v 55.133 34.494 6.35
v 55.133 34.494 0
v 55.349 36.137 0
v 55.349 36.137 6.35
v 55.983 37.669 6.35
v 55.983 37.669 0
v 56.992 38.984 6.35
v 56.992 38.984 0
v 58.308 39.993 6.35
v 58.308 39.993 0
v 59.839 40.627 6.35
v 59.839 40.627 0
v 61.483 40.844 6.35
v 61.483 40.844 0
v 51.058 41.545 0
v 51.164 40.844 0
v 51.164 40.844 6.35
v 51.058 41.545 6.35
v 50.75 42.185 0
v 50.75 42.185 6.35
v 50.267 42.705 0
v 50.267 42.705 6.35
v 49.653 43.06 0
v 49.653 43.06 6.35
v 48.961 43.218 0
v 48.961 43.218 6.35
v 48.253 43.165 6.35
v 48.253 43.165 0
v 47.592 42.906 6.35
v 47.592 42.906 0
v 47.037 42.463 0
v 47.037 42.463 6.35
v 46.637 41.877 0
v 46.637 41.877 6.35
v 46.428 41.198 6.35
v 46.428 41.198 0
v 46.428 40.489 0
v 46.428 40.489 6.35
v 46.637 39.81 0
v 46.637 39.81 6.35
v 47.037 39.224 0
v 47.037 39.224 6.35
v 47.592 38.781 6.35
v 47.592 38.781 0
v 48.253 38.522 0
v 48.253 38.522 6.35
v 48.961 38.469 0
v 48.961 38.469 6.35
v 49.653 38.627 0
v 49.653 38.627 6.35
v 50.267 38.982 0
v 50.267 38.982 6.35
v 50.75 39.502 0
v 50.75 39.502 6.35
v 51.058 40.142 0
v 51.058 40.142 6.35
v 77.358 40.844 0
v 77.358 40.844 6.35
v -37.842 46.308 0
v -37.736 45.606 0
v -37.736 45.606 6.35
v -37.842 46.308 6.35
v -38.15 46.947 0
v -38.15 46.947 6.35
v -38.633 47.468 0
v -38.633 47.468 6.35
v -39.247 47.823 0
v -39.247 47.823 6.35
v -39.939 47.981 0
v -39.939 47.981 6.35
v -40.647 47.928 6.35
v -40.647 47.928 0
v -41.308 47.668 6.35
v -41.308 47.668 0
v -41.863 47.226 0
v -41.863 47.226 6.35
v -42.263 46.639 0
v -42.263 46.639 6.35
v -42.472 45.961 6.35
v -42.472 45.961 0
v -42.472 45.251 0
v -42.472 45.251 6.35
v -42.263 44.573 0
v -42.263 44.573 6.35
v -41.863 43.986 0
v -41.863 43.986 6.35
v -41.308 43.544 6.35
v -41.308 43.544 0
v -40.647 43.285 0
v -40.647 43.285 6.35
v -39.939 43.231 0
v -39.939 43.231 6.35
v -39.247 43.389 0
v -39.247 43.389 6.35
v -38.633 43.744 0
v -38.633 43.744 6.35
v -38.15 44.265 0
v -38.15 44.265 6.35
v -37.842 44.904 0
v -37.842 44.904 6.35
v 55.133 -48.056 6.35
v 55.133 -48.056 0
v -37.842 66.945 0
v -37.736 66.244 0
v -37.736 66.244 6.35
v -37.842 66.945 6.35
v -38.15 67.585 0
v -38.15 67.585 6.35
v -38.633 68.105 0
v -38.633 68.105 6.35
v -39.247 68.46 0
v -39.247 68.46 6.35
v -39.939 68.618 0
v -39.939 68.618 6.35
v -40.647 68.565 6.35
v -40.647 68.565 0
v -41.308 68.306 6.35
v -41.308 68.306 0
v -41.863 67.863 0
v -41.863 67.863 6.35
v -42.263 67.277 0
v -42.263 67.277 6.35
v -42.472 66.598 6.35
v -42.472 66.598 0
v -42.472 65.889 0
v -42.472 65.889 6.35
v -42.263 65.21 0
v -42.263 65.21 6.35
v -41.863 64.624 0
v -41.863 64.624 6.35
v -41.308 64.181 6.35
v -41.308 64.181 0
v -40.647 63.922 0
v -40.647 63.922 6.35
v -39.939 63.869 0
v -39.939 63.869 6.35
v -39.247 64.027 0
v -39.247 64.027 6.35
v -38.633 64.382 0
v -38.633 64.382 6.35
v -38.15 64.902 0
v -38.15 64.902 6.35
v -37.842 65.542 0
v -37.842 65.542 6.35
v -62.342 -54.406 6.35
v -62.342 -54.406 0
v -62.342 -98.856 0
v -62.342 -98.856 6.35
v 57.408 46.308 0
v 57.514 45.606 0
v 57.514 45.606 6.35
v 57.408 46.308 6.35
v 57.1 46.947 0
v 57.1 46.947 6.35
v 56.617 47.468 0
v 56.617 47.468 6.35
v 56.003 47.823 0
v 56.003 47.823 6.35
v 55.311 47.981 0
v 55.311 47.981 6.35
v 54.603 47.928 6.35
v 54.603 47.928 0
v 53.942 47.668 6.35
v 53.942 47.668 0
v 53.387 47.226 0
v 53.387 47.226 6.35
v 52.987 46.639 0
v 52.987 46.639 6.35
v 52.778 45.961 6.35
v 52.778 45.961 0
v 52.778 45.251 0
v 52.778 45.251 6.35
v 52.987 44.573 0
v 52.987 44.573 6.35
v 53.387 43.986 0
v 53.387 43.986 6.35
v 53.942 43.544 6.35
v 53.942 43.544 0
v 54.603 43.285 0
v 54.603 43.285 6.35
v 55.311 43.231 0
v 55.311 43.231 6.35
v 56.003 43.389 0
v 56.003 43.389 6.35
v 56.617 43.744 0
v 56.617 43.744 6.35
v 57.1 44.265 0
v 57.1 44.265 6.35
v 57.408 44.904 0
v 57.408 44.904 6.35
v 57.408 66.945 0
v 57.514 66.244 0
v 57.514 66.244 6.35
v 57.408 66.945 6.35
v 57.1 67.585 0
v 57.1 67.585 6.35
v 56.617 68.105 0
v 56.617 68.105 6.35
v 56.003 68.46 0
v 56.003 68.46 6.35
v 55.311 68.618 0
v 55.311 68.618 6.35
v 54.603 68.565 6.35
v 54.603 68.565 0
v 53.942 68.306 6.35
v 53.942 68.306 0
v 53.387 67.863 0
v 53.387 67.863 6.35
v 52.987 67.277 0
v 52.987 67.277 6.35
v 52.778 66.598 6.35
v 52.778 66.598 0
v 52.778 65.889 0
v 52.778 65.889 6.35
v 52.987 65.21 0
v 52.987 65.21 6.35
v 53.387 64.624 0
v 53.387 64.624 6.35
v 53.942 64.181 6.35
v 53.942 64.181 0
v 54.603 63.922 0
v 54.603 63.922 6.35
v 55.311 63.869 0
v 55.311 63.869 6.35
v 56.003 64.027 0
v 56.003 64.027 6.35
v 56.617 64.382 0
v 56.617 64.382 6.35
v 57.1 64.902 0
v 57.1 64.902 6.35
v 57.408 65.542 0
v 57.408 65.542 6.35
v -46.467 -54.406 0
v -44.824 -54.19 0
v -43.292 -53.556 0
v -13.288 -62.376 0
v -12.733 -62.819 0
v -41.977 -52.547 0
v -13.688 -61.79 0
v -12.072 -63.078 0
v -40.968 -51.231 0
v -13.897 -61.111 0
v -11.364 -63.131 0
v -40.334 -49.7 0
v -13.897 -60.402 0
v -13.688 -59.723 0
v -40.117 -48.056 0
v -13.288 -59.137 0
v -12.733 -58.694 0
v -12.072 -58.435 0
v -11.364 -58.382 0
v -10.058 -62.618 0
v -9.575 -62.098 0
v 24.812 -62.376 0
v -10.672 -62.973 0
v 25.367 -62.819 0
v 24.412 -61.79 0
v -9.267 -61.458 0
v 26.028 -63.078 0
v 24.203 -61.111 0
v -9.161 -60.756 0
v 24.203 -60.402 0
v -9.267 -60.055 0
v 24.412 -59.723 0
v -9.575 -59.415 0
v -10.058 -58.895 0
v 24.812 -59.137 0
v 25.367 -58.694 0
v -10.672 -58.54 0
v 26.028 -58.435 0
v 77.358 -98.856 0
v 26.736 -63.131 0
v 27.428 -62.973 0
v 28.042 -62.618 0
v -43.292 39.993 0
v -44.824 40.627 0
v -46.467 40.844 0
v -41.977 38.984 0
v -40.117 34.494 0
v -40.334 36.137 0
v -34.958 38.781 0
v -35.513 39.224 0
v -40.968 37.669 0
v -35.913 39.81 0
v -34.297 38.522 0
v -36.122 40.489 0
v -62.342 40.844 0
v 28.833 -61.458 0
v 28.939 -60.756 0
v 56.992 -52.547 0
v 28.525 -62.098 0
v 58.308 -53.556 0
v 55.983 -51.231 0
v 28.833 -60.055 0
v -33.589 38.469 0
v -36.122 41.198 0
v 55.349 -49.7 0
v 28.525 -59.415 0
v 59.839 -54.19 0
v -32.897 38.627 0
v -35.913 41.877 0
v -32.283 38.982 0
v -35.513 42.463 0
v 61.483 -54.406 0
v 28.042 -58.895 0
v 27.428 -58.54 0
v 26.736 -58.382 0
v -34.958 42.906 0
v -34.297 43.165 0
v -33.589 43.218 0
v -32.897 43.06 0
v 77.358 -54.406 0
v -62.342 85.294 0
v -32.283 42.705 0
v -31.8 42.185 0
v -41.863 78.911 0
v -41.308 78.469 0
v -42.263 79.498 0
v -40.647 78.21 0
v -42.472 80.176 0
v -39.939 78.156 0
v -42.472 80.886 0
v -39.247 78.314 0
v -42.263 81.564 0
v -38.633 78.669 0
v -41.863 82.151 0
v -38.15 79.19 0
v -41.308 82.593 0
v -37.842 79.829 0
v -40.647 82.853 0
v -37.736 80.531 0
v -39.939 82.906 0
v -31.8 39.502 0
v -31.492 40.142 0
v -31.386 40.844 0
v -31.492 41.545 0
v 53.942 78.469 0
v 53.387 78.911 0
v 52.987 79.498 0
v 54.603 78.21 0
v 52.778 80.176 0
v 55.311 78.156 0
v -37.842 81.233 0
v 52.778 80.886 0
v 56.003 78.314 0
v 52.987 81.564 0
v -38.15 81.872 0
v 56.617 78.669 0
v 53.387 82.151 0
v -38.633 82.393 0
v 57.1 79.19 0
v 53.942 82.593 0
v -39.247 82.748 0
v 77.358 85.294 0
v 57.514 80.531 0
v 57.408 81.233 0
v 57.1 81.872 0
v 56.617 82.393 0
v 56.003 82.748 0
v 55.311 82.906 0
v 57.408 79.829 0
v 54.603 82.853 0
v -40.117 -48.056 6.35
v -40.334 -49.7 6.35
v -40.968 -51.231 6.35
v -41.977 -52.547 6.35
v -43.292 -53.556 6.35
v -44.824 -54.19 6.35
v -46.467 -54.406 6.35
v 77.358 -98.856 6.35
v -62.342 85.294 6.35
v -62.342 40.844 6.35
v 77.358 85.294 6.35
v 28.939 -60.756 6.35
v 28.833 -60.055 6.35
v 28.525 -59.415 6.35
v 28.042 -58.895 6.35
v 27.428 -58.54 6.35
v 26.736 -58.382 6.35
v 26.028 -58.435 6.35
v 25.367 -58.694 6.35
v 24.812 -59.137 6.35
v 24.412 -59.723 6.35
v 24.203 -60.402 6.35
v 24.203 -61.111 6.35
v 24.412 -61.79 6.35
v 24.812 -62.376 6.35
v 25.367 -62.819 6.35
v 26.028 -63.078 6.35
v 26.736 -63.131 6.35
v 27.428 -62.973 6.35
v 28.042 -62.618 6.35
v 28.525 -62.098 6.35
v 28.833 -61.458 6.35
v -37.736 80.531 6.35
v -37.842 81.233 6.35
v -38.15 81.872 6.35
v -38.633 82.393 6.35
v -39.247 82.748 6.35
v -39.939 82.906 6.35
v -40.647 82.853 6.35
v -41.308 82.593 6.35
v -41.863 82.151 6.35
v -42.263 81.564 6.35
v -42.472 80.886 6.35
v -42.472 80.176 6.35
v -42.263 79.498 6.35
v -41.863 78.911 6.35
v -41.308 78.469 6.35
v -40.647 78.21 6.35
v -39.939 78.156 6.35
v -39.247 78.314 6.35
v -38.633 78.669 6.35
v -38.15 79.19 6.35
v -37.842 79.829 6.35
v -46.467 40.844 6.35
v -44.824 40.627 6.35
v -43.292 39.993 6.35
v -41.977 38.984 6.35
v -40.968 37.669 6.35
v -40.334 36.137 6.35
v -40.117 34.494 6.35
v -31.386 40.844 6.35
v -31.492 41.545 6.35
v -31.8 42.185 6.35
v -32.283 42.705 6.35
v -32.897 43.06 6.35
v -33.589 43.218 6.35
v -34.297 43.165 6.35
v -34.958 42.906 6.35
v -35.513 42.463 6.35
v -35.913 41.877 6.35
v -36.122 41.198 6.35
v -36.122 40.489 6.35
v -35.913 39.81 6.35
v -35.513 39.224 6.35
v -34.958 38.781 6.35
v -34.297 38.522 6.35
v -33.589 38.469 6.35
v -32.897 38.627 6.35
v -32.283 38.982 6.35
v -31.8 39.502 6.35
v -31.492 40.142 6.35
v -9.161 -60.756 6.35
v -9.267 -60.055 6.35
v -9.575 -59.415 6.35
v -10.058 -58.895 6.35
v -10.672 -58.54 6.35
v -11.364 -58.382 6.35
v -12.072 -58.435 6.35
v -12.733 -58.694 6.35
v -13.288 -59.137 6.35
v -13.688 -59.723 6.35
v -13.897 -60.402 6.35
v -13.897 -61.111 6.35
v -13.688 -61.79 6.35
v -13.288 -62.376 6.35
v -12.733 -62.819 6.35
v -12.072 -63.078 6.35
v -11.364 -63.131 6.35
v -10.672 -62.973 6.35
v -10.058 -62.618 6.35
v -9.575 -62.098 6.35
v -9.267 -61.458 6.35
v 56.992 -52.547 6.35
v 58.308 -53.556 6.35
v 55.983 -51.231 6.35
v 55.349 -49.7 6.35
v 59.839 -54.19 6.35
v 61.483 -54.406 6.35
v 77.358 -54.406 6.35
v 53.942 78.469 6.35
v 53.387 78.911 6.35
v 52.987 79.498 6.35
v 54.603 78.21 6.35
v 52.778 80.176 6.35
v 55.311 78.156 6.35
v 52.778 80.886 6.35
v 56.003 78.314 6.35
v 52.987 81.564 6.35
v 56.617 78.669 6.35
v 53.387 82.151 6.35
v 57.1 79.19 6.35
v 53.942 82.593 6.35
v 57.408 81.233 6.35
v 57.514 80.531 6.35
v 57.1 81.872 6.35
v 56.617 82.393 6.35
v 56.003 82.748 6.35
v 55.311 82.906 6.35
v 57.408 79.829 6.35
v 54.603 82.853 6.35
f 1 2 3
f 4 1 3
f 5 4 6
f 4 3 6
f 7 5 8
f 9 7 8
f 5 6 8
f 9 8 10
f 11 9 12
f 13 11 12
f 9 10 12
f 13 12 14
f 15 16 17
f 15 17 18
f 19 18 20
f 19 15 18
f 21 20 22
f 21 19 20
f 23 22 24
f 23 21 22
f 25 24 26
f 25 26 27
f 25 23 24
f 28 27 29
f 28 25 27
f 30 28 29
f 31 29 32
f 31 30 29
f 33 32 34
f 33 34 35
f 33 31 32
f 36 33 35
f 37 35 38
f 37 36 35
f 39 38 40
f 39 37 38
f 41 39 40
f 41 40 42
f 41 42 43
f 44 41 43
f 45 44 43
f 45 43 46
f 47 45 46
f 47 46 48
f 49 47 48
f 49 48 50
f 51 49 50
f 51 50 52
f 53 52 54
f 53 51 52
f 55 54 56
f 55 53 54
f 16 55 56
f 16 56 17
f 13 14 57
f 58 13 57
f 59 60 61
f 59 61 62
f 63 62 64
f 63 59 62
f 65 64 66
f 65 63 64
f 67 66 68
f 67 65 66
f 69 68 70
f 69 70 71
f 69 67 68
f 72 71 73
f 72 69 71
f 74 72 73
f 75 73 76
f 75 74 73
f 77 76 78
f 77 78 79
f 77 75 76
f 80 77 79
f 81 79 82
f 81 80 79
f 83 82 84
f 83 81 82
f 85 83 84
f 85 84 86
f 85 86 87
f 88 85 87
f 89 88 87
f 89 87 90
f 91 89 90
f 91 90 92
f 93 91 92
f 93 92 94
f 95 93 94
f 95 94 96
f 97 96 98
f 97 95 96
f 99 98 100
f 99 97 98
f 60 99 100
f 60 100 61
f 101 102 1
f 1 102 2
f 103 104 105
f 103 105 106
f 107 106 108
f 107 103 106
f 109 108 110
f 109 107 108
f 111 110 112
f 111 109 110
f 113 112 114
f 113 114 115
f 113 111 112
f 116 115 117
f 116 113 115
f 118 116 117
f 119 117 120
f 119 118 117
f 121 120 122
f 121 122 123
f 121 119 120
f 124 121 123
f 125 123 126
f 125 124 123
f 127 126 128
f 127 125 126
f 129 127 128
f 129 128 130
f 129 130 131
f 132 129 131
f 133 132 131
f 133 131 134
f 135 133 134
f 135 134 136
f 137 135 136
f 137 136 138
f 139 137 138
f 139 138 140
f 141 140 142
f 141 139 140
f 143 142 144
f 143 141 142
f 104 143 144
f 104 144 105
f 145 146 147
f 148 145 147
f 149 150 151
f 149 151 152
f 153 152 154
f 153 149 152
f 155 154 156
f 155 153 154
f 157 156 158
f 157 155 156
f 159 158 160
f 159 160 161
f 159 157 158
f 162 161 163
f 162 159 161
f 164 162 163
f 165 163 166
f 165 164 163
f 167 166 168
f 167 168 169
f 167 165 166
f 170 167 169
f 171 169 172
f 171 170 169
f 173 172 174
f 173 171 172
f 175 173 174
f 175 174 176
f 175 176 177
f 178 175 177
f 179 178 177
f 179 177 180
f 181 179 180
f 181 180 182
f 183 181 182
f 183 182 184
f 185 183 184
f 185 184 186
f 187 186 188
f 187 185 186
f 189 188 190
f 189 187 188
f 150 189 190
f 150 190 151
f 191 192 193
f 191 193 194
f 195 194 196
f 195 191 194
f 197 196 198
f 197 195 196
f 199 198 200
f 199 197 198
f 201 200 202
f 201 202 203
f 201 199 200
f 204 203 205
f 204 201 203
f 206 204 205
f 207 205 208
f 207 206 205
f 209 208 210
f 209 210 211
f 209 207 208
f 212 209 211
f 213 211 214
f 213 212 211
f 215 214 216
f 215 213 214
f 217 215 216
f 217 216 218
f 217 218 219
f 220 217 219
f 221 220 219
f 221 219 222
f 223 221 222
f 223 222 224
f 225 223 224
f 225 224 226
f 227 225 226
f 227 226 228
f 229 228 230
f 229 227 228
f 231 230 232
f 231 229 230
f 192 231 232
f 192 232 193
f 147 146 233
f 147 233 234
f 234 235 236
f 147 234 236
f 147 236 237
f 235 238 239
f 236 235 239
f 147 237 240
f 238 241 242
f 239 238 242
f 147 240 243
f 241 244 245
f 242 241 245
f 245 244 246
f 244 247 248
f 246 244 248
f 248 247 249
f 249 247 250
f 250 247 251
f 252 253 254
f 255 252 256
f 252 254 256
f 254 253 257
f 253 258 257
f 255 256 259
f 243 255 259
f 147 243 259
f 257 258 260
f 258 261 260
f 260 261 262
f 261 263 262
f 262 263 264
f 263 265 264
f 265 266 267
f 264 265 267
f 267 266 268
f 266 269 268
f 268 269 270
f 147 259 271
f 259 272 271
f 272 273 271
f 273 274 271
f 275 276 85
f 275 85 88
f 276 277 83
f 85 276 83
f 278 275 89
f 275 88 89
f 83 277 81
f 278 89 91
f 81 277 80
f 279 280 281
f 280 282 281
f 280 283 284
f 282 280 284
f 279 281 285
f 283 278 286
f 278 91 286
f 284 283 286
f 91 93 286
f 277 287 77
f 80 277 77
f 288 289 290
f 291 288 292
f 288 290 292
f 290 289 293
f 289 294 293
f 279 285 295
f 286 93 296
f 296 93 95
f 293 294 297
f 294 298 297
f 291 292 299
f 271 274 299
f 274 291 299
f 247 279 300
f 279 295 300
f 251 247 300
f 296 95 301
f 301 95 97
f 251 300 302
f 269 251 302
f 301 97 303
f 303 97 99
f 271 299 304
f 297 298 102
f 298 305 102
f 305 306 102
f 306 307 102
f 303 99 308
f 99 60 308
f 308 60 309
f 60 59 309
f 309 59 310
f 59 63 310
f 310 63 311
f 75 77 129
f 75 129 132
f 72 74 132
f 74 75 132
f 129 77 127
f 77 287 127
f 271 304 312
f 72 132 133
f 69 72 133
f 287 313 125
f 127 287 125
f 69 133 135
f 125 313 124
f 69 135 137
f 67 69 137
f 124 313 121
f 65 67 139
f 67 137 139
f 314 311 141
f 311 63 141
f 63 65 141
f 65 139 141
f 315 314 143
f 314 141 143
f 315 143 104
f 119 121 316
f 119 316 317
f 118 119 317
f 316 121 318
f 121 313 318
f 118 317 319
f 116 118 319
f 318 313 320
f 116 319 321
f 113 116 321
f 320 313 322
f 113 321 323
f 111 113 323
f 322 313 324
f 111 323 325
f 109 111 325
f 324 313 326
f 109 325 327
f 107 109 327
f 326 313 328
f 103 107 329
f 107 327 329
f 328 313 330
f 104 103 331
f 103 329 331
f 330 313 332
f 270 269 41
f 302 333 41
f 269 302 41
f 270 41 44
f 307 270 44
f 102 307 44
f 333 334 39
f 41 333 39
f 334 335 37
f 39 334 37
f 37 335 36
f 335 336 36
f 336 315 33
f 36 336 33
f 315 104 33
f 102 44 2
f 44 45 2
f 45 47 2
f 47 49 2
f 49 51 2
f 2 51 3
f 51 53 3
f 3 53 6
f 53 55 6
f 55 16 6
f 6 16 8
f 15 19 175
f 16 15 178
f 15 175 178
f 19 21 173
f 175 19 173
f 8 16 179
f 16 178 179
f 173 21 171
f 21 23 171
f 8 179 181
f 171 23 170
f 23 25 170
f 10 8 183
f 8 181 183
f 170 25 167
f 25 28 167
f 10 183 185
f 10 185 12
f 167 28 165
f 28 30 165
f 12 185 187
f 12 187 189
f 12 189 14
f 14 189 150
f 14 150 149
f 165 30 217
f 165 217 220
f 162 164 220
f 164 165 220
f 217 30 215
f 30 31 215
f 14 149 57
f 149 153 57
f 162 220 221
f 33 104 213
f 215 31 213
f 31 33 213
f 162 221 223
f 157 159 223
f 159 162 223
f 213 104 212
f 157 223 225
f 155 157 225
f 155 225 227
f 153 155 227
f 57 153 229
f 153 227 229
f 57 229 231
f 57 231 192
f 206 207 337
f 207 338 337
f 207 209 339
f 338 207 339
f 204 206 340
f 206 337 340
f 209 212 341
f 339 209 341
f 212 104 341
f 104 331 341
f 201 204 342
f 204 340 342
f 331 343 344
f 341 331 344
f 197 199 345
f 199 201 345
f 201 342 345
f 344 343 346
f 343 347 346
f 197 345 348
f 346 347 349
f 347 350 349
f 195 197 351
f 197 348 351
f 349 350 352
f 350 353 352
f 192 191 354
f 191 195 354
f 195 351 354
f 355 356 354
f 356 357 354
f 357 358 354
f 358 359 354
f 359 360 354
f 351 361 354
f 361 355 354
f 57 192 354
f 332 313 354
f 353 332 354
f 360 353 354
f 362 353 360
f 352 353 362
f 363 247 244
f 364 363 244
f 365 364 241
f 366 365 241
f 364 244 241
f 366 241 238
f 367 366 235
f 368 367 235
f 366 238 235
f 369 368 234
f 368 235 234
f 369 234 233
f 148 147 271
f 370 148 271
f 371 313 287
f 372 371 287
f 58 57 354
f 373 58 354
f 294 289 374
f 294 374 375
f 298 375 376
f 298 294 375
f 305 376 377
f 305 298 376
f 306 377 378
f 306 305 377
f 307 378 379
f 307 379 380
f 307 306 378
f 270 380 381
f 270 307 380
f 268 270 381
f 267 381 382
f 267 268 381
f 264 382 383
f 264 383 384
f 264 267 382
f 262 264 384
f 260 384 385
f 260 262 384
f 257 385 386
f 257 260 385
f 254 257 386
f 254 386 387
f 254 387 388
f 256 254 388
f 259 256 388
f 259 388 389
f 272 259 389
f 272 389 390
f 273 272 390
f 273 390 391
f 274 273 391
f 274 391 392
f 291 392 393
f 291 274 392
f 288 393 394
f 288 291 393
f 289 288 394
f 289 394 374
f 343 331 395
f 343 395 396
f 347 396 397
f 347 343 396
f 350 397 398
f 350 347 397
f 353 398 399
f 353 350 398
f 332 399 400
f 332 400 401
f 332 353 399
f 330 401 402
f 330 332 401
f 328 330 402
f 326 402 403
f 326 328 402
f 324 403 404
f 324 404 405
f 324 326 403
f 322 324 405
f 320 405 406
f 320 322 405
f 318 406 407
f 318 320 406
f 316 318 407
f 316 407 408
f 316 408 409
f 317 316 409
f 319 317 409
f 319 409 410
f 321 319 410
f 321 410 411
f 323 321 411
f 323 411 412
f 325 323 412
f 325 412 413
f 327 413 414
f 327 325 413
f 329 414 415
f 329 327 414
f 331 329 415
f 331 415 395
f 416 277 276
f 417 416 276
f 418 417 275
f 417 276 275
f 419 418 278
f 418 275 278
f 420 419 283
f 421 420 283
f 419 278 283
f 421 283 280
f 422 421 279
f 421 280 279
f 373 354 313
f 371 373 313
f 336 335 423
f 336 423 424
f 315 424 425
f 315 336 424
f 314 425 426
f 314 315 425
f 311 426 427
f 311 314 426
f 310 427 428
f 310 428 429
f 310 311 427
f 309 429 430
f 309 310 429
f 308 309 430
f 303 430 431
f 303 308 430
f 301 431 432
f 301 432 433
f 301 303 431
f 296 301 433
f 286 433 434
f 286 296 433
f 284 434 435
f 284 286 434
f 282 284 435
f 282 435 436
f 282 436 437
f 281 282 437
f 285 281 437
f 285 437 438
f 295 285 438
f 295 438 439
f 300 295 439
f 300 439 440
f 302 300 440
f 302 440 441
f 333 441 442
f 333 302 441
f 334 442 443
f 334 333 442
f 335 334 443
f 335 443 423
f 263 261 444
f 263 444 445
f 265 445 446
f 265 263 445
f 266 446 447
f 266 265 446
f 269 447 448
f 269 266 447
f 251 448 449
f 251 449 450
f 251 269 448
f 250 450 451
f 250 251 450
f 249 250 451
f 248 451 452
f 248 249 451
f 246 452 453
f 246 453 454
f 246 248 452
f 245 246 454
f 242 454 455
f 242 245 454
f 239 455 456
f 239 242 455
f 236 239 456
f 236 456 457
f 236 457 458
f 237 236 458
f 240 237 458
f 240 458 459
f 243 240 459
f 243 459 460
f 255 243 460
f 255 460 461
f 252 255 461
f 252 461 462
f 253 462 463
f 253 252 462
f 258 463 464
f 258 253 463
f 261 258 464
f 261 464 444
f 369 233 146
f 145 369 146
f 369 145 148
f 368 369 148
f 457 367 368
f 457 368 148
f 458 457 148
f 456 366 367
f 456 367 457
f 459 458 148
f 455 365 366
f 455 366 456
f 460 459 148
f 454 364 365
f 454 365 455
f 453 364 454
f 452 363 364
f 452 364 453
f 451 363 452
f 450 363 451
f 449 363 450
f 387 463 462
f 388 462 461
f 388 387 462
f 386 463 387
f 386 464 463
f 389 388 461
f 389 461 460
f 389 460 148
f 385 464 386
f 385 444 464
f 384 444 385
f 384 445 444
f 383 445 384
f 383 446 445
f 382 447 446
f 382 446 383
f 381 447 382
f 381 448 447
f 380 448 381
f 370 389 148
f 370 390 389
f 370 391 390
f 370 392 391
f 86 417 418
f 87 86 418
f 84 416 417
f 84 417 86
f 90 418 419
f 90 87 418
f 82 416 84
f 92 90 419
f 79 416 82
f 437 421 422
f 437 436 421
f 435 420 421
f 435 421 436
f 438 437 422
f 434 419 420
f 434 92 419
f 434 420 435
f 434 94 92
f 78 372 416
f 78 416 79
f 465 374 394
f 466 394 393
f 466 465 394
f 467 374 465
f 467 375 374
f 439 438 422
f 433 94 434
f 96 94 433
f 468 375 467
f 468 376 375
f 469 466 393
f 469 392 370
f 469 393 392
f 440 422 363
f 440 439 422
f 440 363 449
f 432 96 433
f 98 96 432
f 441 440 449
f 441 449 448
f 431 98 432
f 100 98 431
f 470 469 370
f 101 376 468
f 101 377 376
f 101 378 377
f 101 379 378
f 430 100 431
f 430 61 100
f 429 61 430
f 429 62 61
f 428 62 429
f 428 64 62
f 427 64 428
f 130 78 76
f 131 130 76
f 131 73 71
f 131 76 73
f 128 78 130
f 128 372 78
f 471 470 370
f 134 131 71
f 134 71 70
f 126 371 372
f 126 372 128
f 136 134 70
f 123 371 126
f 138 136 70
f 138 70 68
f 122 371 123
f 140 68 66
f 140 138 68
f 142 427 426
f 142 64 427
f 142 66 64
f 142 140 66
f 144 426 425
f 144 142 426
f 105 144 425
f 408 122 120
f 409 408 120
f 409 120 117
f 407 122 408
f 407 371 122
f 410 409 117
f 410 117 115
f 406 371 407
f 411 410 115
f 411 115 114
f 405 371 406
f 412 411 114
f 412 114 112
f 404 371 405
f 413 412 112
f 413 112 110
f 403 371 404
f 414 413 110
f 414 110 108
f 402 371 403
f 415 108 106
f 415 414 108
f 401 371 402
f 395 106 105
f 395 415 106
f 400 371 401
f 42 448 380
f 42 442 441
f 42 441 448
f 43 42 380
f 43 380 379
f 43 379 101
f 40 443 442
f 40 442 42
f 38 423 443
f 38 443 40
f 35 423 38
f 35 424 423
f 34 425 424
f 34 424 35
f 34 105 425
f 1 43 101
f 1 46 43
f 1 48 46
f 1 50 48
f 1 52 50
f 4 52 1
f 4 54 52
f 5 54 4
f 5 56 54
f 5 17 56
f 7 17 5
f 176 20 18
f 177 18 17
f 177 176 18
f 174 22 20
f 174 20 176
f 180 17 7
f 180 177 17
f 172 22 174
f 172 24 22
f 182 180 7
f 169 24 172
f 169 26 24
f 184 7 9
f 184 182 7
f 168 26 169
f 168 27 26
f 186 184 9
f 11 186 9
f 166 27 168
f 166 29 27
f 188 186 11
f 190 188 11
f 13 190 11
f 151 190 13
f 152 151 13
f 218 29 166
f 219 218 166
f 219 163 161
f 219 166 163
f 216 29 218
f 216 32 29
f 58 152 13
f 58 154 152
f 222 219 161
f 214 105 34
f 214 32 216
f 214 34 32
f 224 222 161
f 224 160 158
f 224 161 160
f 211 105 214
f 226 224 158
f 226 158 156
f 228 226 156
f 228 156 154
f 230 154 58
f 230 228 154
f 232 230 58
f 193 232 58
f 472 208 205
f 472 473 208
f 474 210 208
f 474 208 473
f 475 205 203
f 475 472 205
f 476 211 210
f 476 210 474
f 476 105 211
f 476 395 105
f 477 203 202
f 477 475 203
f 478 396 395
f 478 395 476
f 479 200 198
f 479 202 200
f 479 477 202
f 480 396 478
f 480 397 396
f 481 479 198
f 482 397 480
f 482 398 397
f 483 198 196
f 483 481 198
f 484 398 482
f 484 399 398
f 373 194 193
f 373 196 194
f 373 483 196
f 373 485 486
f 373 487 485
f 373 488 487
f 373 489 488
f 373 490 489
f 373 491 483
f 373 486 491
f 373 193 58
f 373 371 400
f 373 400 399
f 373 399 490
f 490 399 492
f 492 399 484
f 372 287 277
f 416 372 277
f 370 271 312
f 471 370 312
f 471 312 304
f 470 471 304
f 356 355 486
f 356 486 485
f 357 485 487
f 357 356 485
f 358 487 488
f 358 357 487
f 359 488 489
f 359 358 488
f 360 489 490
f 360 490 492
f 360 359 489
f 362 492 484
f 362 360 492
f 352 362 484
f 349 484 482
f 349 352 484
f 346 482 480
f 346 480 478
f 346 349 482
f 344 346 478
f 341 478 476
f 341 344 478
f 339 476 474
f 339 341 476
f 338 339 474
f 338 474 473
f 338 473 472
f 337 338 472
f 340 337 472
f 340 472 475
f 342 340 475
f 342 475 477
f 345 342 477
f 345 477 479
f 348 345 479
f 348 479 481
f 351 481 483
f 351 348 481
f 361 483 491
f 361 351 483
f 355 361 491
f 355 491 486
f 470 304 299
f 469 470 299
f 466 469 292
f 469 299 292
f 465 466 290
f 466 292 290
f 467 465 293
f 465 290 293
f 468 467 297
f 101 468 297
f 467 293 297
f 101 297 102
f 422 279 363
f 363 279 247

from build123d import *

# Parameters (mm, degrees)
F0_R     = 2.38125
F1_DEPTH = 6.35


with BuildPart() as f1:
    # F0 (on Top) → F1 (new body)
    with BuildSketch(Plane.XY):
        with BuildLine():
            Line((77.357605, 85.293555), (-62.342395, 85.293555))
            Line((-62.342395, 85.293555), (-62.342395, 40.843555))
            Line((-62.342395, 40.843555), (-46.467395, 40.843555))
            ThreePointArc((-46.467395, 40.843555), (-41.977267, 38.983683), (-40.117395, 34.493555))
            Line((-40.117395, 34.493555), (-40.117395, -48.056445))
            ThreePointArc((-40.117395, -48.056445), (-41.977267, -52.546573), (-46.467395, -54.406445))
            Line((-46.467395, -54.406445), (-62.342395, -54.406445))
            Line((-62.342395, -54.406445), (-62.342395, -98.856445))
            Line((-62.342395, -98.856445), (-11.542395, -98.856445))
            Line((-11.542395, -98.856445), (77.357605, -98.856445))
            Line((77.357605, -98.856445), (77.357605, -54.406445))
            Line((77.357605, -54.406445), (61.482605, -54.406445))
            ThreePointArc((61.482605, -54.406445), (56.992477, -52.546573), (55.132605, -48.056445))
            Line((55.132605, -48.056445), (55.132605, 34.493555))
            ThreePointArc((55.132605, 34.493555), (56.992477, 38.983683), (61.482605, 40.843555))
            Line((61.482605, 40.843555), (77.357605, 40.843555))
            Line((77.357605, 40.843555), (77.357605, 85.293555))
        make_face()
        with Locations((-11.542395, -60.756445)):
            Circle(F0_R, mode=Mode.SUBTRACT)
        with Locations((26.557605, -60.756445)):
            Circle(F0_R, mode=Mode.SUBTRACT)
        with Locations((-40.117395, 45.606055)):
            Circle(F0_R, mode=Mode.SUBTRACT)
        with Locations((-33.767395, 40.843555)):
            Circle(F0_R, mode=Mode.SUBTRACT)
        with Locations((-40.117395, 66.243555)):
            Circle(F0_R, mode=Mode.SUBTRACT)
        with Locations((-40.117395, 80.531055)):
            Circle(F0_R, mode=Mode.SUBTRACT)
        with Locations((48.782605, 40.843555)):
            Circle(F0_R, mode=Mode.SUBTRACT)
        with Locations((55.132605, 45.606055)):
            Circle(F0_R, mode=Mode.SUBTRACT)
        with Locations((55.132605, 66.243555)):
            Circle(F0_R, mode=Mode.SUBTRACT)
        with Locations((55.132605, 80.531055)):
            Circle(F0_R, mode=Mode.SUBTRACT)
    extrude(amount=F1_DEPTH)


solid = f1.part
